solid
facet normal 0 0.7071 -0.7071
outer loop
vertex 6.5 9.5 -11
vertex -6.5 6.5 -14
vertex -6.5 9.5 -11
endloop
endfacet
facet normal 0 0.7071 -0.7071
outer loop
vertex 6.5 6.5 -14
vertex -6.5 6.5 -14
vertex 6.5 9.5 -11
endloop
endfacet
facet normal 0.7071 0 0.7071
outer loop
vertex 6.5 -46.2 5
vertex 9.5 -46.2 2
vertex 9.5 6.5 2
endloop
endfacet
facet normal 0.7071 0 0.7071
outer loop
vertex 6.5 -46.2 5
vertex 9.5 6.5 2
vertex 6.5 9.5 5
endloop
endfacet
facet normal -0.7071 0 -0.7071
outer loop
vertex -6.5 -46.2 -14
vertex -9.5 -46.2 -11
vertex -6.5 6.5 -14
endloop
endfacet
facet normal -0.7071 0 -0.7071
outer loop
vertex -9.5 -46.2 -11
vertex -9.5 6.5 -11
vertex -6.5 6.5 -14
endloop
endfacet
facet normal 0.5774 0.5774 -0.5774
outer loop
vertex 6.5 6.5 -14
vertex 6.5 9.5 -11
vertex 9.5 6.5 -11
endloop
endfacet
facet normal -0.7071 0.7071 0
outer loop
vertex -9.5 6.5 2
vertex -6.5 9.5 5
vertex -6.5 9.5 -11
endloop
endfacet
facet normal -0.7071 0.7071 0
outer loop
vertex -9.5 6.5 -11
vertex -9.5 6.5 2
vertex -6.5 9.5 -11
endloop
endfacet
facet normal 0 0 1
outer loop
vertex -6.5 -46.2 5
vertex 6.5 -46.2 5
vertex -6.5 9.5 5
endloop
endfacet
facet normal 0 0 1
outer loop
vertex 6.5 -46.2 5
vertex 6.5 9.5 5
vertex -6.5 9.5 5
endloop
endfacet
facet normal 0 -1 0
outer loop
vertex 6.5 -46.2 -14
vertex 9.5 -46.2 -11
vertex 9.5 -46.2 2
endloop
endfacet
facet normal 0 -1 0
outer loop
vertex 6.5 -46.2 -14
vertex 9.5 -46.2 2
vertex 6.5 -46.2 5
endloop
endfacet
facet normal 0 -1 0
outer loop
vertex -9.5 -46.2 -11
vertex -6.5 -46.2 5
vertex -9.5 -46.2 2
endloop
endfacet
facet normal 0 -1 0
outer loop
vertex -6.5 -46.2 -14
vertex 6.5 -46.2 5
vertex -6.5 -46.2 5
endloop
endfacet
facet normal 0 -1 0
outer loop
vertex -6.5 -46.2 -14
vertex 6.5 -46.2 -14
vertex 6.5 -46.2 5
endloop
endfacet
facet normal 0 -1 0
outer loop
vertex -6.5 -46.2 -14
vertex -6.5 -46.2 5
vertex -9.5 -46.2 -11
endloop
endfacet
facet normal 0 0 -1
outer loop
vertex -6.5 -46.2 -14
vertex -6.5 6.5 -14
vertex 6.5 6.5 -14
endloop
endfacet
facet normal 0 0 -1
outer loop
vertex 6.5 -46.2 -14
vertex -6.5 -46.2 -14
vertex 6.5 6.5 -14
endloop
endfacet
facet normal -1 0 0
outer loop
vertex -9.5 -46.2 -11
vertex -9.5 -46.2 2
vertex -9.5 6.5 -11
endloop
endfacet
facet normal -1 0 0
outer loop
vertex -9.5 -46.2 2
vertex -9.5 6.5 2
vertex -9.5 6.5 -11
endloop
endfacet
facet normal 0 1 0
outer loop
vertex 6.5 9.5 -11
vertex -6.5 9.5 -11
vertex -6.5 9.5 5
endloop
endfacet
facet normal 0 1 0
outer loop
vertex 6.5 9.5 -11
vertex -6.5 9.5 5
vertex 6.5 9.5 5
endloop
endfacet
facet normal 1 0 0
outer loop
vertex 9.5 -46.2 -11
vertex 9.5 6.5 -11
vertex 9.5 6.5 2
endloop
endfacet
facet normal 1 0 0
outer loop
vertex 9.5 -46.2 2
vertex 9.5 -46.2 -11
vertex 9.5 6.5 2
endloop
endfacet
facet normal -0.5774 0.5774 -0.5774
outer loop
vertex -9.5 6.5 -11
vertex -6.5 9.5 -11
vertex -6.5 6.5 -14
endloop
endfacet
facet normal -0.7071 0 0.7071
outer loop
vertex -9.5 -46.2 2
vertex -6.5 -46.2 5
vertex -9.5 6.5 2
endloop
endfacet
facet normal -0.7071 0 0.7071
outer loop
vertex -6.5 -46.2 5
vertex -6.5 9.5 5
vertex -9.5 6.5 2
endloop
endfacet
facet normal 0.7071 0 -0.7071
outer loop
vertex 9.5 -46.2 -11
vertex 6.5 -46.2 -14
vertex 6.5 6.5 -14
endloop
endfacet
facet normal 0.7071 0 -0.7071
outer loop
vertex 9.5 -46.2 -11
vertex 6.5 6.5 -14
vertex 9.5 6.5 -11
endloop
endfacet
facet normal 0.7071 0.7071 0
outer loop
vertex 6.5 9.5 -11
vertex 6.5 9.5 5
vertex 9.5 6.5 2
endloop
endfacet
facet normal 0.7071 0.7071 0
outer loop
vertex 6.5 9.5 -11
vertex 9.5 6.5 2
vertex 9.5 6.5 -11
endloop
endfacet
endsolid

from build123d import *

# Parameters (mm, degrees)
SKETCH006_W       = 19
SKETCH006_H       = 19
PAD004_DEPTH      = 5
PAD004_DEPTH_BACK = 14
CHAMFER001_SIZE   = 3
PAD005_DEPTH      = 36.7


with BuildPart() as part:
    # Sketch006 → Pad004 (new body, two sides)
    with BuildSketch(Plane.XY) as pad004_sk:
        Rectangle(SKETCH006_W, SKETCH006_H)
    extrude(amount=PAD004_DEPTH)
    extrude(pad004_sk.sketch, amount=-PAD004_DEPTH_BACK)

    # Chamfer001
    chamfer001_edges = [part.edges().sort_by_distance(p)[0] for p in [
        (9.5, 9.5, -4.5),
        (-9.5, 9.5, -4.5),
        (0, 9.5, -14),
        (-9.5, 0, -14),
        (9.5, 0, -14),
        (-9.5, 0, 5),
        (9.5, 0, 5),
    ]]
    chamfer(chamfer001_edges, length=CHAMFER001_SIZE)

    # Chamfer001 Face8 → Pad005 (add)
    with BuildSketch(Plane(origin=(0, -9.5, -4.5), x_dir=(-1, 0, 0), z_dir=(0, -1, 0))):
        Polygon((-9.5, 6.5), (-9.5, -6.5), (-6.5, -9.5), (6.5, -9.5), (9.5, -6.5), (9.5, 6.5), (6.5, 9.5), (-6.5, 9.5), align=None)
    extrude(amount=PAD005_DEPTH)


solid = part.part
